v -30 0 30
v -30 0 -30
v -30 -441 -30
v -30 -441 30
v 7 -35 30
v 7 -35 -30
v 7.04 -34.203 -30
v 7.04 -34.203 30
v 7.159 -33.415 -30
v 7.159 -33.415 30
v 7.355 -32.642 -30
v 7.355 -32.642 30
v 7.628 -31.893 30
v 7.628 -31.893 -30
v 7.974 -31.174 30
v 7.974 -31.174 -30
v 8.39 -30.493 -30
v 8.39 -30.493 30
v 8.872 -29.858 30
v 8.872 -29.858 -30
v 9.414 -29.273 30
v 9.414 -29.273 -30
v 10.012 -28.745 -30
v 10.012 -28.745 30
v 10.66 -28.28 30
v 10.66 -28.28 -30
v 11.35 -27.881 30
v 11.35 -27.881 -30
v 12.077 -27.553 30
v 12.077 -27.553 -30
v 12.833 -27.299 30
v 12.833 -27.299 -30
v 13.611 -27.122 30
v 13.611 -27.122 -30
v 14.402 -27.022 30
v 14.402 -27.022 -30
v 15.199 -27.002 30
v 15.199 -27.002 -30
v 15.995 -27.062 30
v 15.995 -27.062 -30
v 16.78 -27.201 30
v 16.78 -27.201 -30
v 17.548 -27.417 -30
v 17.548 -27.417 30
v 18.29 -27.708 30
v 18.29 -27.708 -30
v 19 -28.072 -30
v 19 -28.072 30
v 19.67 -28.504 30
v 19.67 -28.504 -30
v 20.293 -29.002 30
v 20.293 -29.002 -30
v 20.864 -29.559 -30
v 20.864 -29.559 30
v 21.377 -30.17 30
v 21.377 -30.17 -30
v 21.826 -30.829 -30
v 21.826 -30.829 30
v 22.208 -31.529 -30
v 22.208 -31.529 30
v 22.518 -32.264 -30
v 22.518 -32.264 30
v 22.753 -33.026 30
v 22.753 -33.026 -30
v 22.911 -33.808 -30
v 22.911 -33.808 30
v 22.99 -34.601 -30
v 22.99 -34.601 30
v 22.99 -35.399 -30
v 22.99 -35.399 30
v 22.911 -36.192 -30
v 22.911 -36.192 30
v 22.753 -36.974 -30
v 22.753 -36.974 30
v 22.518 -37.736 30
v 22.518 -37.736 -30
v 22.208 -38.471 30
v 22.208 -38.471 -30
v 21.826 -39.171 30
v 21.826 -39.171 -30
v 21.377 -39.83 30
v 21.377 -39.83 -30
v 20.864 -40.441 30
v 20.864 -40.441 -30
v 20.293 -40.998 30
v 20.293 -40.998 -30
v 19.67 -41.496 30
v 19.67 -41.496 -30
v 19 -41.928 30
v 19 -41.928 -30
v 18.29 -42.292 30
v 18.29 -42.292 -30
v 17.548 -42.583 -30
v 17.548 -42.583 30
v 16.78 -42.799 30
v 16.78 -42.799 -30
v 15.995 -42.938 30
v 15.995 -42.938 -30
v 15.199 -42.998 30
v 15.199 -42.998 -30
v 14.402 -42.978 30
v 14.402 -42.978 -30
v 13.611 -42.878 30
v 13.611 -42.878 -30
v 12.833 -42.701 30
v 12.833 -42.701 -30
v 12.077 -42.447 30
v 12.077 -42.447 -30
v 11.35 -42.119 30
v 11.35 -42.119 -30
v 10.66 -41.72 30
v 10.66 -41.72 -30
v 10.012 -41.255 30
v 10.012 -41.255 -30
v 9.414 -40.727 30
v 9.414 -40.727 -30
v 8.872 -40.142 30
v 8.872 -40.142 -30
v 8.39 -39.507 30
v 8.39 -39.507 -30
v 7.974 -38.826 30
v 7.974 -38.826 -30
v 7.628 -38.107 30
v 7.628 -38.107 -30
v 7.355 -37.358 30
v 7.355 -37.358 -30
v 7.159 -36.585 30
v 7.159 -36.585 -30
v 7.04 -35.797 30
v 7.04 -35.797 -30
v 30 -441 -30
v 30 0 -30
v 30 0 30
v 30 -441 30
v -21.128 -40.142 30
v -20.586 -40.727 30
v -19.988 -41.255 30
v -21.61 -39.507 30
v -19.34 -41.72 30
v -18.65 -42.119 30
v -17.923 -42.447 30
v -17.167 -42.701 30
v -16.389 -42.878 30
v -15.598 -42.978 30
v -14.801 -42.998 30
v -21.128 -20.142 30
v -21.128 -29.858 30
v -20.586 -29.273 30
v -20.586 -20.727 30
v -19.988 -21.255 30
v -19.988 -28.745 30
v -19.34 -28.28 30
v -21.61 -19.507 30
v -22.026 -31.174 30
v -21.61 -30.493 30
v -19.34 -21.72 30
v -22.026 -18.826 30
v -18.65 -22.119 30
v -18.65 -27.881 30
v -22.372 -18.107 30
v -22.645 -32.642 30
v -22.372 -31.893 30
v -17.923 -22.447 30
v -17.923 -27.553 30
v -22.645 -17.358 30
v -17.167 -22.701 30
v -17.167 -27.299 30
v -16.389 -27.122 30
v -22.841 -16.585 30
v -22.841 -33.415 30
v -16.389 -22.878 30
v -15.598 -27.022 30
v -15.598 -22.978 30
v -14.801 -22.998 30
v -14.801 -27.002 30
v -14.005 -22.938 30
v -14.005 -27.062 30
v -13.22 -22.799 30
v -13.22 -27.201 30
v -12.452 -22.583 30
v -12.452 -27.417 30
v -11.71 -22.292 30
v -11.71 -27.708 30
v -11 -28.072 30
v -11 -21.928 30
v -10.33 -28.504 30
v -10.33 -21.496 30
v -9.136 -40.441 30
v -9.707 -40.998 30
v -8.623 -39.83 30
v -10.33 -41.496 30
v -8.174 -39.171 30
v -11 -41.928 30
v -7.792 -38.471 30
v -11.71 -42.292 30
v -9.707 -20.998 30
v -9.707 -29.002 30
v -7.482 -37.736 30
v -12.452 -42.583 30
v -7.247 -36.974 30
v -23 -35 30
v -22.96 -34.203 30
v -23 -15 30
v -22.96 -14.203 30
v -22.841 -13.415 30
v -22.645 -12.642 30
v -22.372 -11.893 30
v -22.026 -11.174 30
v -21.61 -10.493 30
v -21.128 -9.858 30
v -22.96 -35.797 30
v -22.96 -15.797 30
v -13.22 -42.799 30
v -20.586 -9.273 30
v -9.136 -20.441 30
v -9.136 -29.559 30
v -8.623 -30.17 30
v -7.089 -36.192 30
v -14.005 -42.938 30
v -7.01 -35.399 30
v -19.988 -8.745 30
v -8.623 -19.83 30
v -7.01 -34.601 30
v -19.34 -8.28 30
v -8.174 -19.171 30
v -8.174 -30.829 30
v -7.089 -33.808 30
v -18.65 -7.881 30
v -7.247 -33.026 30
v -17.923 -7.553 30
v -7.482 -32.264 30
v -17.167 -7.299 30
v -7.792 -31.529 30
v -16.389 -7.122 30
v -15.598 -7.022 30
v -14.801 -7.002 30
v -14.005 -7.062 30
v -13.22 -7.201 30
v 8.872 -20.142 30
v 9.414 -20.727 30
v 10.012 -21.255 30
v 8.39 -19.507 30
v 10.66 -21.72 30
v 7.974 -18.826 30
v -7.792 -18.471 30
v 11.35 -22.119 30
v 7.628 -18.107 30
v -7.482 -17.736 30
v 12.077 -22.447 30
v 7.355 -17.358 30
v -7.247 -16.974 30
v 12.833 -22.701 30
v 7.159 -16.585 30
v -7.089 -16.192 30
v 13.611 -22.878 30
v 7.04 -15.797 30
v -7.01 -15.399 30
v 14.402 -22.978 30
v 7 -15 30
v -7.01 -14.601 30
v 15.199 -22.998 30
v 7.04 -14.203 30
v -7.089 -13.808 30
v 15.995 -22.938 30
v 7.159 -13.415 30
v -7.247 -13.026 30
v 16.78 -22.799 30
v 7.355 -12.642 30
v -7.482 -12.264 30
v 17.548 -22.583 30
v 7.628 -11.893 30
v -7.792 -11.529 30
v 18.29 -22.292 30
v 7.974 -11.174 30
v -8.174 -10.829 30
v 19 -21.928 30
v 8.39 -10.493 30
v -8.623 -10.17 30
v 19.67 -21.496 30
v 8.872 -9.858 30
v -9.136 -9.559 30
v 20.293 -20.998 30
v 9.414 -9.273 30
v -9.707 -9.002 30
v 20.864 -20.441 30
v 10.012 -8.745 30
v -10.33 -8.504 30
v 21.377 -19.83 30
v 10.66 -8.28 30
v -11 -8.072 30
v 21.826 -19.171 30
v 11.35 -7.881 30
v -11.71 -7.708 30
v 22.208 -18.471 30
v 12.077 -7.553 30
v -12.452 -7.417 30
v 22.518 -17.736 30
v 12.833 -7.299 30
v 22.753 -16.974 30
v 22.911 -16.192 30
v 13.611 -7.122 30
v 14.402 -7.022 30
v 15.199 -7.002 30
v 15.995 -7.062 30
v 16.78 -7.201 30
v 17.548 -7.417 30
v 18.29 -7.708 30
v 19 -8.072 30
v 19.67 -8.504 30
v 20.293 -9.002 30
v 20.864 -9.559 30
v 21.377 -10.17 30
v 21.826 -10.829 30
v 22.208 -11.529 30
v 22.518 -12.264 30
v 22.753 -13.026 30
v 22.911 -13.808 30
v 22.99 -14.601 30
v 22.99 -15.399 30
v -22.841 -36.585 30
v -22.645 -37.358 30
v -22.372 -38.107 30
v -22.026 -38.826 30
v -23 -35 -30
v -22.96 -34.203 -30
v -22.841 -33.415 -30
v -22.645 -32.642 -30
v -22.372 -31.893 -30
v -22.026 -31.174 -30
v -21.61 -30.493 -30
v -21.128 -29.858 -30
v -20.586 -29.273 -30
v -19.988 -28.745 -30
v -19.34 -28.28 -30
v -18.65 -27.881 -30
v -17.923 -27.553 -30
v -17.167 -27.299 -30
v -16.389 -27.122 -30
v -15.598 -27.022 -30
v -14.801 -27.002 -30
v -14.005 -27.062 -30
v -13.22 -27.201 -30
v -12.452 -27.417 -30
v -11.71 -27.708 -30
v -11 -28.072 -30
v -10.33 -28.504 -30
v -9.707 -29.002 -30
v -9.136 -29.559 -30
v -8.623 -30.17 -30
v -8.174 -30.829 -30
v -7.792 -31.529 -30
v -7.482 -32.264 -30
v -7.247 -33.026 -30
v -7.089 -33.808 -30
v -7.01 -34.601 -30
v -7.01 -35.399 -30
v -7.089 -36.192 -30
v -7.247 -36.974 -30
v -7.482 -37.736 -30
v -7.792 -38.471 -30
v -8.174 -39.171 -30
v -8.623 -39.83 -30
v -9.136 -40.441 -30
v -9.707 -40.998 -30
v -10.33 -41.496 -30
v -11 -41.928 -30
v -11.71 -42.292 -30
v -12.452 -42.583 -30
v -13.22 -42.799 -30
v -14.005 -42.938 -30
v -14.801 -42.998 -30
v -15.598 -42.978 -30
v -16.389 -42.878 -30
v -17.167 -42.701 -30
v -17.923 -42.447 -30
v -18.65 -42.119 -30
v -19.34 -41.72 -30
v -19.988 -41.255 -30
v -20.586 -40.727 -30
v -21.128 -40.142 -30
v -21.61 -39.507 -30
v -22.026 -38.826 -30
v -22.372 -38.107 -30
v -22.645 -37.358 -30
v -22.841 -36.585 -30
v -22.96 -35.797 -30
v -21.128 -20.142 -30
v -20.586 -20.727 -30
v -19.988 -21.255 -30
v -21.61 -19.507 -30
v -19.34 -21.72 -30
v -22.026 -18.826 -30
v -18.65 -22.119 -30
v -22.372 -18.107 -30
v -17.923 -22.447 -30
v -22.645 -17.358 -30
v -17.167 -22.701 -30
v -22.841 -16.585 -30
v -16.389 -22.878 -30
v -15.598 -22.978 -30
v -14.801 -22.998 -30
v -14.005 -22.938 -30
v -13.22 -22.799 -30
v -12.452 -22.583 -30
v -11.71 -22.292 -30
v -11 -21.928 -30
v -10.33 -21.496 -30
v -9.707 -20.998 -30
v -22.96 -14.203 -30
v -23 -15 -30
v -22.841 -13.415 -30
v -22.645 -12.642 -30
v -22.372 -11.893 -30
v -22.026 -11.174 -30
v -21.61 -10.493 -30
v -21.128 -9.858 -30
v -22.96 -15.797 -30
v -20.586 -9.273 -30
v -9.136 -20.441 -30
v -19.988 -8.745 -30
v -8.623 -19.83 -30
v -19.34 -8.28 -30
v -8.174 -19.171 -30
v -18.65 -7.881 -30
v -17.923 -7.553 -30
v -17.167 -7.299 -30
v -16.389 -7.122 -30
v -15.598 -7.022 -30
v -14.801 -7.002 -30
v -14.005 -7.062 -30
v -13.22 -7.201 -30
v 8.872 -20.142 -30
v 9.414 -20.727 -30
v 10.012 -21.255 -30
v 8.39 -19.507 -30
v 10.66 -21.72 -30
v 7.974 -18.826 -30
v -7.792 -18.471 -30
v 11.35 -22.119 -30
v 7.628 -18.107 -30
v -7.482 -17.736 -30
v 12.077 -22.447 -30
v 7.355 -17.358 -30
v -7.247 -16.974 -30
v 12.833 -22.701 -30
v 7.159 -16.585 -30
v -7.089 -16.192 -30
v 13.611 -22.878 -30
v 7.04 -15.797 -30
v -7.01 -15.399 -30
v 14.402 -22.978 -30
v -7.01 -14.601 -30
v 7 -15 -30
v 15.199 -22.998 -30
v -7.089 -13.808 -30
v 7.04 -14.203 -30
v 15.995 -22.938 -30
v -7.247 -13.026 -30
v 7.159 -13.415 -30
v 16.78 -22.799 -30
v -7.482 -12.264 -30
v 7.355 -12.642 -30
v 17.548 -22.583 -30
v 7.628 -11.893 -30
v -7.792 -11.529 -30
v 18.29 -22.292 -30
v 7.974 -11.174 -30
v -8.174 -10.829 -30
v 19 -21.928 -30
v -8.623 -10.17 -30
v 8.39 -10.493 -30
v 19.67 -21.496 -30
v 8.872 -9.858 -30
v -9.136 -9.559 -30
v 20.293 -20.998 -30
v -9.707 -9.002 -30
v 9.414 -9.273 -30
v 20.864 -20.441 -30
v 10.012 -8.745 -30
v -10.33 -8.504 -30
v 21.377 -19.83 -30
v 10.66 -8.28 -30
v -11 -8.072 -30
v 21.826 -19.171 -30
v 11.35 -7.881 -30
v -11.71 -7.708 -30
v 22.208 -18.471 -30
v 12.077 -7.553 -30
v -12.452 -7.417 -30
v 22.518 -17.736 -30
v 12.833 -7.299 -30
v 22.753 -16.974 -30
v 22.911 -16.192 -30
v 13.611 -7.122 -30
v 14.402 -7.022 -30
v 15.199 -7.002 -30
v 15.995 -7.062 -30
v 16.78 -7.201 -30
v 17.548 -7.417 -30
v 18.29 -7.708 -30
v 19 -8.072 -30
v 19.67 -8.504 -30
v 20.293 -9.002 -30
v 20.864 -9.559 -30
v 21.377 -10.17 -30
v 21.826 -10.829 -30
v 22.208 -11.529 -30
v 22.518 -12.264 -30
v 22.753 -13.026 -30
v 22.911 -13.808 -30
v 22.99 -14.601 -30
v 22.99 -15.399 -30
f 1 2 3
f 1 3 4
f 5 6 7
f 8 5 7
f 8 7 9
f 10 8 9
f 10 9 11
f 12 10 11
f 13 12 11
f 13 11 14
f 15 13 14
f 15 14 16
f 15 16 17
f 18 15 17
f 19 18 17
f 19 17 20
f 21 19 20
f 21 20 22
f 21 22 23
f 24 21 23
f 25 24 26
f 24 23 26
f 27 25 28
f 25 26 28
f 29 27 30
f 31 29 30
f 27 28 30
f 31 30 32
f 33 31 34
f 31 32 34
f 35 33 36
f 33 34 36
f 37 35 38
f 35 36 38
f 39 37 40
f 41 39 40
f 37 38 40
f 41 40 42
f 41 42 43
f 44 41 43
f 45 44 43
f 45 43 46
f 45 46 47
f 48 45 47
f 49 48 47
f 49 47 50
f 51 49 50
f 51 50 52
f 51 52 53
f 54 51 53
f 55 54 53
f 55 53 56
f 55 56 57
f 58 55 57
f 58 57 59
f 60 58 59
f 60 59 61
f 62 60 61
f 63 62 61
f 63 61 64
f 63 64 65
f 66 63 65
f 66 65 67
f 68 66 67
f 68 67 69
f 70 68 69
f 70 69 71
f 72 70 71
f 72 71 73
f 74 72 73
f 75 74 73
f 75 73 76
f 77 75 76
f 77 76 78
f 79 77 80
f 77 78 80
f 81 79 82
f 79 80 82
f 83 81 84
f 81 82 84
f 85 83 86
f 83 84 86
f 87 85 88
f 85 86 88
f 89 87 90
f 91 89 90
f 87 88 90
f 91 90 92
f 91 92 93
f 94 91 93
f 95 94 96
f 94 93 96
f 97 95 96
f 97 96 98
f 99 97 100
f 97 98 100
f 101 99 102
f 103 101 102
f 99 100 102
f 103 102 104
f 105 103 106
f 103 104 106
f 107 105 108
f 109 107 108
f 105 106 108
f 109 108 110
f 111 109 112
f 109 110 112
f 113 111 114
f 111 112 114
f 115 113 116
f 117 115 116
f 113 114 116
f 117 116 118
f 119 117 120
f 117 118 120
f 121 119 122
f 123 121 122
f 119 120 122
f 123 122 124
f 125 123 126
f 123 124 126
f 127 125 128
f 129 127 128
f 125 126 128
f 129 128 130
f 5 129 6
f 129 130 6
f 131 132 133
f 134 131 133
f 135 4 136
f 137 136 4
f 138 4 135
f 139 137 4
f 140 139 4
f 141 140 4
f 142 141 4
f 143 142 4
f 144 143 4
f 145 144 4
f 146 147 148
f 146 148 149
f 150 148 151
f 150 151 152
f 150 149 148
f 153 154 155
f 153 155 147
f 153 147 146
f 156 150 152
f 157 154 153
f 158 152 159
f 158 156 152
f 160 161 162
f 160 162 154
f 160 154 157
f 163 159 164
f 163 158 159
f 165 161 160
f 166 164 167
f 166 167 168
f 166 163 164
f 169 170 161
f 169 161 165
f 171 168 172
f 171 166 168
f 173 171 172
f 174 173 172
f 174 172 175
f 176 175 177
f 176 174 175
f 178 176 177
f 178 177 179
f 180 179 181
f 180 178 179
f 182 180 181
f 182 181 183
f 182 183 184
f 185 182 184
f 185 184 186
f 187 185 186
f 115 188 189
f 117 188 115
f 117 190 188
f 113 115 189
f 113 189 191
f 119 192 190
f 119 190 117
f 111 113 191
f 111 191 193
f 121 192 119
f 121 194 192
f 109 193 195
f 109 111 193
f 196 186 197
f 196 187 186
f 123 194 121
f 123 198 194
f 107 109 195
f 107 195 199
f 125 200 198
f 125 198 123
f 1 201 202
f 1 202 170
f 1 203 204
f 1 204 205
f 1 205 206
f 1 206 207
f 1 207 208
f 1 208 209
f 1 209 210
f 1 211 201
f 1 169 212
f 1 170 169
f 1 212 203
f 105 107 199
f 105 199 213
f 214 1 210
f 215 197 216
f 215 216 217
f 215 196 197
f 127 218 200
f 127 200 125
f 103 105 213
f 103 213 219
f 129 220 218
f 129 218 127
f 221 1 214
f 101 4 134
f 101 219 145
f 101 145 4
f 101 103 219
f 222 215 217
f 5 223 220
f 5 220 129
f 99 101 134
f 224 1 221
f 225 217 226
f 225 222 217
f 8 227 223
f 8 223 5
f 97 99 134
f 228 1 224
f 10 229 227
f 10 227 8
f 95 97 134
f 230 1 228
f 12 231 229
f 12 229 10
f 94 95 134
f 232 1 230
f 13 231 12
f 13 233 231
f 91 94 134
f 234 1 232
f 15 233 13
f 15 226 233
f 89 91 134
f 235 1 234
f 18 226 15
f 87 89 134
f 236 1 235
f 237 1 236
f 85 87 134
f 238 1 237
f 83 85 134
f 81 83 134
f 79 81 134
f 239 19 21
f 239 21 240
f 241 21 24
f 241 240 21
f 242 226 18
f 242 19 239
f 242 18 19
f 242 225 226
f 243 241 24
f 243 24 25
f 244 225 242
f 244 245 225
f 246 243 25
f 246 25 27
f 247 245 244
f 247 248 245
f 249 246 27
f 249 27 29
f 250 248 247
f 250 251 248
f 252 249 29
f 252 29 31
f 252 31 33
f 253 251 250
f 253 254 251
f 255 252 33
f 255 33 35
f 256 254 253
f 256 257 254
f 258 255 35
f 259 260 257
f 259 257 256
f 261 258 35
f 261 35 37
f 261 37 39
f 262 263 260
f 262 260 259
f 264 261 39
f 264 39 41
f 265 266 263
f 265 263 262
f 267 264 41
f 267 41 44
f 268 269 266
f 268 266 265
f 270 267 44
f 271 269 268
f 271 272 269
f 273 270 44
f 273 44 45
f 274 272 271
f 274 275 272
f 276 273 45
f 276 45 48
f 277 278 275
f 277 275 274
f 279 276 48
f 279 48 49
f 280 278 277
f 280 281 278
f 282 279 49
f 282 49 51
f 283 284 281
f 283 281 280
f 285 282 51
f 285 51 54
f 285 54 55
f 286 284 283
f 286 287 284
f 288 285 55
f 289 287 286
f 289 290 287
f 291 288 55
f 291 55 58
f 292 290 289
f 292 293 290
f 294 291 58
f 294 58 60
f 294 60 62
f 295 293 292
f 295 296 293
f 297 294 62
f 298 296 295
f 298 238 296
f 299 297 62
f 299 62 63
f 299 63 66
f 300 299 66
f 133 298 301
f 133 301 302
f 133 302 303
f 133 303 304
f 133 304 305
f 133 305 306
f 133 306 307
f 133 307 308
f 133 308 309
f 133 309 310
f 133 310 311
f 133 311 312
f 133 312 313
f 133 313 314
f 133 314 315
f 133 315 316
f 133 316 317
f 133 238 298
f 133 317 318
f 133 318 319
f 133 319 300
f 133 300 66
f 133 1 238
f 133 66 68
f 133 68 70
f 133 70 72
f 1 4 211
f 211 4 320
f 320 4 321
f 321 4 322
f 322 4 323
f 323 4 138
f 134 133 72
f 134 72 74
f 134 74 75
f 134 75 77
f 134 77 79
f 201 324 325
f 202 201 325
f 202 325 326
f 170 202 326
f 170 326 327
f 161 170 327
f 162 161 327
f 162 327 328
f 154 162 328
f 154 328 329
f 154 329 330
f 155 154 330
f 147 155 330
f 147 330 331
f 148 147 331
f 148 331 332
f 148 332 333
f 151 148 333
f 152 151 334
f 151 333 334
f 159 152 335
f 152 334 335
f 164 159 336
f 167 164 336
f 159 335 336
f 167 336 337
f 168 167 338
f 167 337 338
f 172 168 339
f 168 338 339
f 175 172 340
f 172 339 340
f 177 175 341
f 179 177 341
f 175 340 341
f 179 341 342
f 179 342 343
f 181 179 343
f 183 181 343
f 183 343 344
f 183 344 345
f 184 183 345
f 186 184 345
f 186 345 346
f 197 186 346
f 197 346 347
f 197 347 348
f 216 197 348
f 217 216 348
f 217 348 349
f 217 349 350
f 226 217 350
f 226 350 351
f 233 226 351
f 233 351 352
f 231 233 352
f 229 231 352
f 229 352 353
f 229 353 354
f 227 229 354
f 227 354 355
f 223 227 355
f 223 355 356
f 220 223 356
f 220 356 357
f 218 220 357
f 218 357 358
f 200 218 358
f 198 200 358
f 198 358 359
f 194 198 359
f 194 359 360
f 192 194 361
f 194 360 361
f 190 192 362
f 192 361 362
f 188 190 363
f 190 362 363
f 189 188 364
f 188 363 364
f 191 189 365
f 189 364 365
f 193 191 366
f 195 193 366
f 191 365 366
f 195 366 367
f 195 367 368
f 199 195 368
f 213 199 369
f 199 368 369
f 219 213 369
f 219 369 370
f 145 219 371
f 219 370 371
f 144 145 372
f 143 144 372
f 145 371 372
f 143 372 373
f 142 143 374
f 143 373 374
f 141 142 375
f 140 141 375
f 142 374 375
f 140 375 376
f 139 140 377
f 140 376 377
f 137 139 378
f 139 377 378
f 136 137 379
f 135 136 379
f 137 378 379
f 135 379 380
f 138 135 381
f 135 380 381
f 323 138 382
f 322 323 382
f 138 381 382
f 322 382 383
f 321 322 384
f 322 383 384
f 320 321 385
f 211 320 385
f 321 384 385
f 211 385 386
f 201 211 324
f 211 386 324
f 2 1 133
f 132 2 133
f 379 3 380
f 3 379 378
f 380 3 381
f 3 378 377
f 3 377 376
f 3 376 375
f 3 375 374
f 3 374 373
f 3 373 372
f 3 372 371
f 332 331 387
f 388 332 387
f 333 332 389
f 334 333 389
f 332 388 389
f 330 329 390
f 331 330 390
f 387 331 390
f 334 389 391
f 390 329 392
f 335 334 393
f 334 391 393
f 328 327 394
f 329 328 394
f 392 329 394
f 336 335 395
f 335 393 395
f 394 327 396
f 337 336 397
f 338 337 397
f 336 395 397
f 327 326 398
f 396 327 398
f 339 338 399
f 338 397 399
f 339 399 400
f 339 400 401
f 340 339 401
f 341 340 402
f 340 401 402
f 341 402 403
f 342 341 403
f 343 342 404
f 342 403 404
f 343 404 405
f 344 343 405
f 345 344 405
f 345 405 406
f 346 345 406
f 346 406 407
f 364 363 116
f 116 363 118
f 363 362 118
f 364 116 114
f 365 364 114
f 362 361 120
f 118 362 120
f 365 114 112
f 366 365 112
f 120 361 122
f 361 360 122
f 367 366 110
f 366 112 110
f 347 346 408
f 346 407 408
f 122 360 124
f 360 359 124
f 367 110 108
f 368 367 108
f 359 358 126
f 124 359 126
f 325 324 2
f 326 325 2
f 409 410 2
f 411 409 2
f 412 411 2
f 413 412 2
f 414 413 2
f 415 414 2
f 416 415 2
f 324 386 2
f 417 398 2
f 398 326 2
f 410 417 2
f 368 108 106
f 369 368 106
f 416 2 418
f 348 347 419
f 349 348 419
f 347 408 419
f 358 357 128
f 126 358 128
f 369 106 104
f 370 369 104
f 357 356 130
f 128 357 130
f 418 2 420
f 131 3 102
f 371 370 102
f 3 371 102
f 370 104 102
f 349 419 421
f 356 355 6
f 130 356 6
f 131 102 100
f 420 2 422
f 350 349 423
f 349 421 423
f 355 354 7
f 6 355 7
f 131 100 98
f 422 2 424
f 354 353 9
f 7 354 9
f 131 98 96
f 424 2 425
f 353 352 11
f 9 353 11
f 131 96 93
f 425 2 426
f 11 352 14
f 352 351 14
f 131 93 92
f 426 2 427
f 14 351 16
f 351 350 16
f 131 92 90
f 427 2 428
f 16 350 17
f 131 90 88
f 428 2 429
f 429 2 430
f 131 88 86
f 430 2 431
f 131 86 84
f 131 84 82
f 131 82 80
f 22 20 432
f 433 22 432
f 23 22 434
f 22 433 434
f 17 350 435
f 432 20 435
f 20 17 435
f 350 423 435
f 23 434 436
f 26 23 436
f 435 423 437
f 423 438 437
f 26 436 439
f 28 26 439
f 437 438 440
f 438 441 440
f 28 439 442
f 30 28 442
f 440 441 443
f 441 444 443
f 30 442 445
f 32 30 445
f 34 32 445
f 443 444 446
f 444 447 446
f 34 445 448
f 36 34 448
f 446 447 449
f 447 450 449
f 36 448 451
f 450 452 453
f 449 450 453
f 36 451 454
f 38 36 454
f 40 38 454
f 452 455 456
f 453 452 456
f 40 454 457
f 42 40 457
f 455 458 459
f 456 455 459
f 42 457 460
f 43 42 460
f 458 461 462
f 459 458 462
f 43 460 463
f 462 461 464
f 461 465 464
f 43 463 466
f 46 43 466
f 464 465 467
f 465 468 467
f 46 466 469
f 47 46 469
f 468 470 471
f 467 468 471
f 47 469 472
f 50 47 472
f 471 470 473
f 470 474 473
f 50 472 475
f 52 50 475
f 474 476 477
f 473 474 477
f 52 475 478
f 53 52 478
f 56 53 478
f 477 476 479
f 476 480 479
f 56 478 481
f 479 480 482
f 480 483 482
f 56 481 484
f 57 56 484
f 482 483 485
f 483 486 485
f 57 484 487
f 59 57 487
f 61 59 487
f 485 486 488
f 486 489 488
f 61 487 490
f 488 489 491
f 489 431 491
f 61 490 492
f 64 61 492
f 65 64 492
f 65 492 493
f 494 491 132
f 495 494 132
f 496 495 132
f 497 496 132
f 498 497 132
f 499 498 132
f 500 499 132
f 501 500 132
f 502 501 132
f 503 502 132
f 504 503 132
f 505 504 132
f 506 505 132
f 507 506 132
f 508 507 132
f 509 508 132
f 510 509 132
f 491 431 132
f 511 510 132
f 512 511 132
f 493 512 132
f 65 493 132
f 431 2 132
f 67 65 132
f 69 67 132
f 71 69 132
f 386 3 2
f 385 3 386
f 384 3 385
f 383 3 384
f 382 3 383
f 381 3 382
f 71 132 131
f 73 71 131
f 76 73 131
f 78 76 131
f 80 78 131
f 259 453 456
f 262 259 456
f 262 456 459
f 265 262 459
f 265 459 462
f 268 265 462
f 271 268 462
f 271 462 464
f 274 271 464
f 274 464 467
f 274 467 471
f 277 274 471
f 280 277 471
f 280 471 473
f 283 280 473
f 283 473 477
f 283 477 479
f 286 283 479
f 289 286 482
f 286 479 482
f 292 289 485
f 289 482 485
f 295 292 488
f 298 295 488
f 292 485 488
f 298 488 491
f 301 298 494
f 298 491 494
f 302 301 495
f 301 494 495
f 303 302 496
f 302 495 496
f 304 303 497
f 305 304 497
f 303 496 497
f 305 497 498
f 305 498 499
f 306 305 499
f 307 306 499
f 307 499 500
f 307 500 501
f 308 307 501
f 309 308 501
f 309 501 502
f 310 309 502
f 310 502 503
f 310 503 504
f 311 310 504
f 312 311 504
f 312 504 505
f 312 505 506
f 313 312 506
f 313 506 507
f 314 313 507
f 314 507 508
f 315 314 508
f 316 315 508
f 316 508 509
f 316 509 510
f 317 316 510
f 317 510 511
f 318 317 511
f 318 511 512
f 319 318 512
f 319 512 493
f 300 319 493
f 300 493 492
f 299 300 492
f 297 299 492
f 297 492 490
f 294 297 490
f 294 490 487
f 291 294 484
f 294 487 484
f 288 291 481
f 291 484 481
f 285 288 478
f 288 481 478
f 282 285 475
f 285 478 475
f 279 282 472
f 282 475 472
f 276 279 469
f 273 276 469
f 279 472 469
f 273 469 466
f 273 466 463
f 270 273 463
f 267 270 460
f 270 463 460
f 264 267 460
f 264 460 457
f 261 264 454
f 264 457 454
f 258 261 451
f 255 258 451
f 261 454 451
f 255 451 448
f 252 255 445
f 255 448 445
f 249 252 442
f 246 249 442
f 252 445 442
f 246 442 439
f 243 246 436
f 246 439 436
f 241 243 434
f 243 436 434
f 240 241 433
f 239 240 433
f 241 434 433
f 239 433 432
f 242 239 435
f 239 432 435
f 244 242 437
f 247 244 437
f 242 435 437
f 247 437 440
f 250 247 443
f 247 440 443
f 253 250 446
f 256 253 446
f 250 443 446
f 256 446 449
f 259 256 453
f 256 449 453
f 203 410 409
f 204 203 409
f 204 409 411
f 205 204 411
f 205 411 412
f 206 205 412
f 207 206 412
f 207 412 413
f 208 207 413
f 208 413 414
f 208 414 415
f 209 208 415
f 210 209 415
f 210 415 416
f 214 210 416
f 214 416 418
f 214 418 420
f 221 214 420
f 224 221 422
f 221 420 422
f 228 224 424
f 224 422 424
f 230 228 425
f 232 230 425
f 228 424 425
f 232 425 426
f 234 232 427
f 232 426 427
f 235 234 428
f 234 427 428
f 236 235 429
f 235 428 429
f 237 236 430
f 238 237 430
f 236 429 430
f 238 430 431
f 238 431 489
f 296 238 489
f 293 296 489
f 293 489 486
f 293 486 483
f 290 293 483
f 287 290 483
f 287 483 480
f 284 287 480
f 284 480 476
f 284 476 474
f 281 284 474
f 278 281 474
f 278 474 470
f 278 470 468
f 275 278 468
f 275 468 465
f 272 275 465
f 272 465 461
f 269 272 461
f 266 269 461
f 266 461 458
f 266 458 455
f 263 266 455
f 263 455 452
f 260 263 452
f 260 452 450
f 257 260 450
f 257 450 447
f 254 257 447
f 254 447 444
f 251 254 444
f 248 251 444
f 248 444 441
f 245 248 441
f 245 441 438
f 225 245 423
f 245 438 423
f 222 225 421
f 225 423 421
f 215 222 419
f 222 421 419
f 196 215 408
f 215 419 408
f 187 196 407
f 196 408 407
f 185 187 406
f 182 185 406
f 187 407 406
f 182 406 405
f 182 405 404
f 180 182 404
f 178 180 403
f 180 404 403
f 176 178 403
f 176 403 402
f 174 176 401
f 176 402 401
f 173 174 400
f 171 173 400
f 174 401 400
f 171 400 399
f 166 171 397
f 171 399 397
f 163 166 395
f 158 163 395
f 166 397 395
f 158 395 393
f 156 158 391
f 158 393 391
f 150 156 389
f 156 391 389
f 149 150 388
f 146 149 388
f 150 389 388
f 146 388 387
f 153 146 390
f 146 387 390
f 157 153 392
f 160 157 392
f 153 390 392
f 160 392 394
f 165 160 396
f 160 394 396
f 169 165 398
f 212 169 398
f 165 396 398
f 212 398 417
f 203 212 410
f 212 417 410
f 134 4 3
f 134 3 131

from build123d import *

# Parameters (mm, degrees)
F0_W     = 60
F0_H     = 60
F1_DEPTH = 441
F3_D     = 16


with BuildPart() as f1:
    # F0 (on Front) → F1 (new body)
    with BuildSketch(Plane.XZ):
        Rectangle(F0_W, F0_H)
    extrude(amount=F1_DEPTH)

    # F3 (through all)
    with Locations(Plane.XY.offset(30)):
        with Locations((-15, -15), (15, -15), (-15, -35), (15, -35)):
            Hole(F3_D / 2)


solid = f1.part
